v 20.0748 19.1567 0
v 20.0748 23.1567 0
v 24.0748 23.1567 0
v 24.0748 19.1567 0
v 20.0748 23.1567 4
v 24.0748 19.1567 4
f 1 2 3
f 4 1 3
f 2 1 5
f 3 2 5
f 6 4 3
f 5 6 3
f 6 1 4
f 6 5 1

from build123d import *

# Parameters (mm, degrees)
F0_W     = 4
F0_H     = 4
F1_DEPTH = 4
F4_DEPTH = 25
F7_DEPTH = 25


with BuildPart() as f1:
    # F0 (on Top) → F1 (new body)
    with BuildSketch(Plane.XY):
        with Locations((22.0747571118, 21.156716859)):
            Rectangle(F0_W, F0_H)
    extrude(amount=F1_DEPTH)

    # F3 (on 3pt) → F4 (cut)
    with BuildSketch(Plane(origin=(13.0771579903, 13.0771579903, -13.0771579903), x_dir=(0.8164965809, -0.4082482905, 0.4082482905), z_dir=(-0.5773502692, -0.5773502692, 0.5773502692))):
        Polygon((13.4692531218, 16.374271521), (8.5702736362, 19.2026986457), (8.5702736362, 13.5458443962), align=None)
    extrude(amount=F4_DEPTH, mode=Mode.SUBTRACT)

    # F6 (on 3pt) → F7 (cut)
    with BuildSketch(Plane(origin=(15.7438246569, 15.7438246569, 15.7438246569), x_dir=(-0.4082482905, 0.8164965809, -0.4082482905), z_dir=(0.5773502692, 0.5773502692, 0.5773502692))):
        Polygon((9.0789017066, -17.0234240092), (9.0789017066, -11.3665697597), (4.1799222211, -14.1949968844), align=None)
    extrude(amount=F7_DEPTH, mode=Mode.SUBTRACT)


solid = f1.part
